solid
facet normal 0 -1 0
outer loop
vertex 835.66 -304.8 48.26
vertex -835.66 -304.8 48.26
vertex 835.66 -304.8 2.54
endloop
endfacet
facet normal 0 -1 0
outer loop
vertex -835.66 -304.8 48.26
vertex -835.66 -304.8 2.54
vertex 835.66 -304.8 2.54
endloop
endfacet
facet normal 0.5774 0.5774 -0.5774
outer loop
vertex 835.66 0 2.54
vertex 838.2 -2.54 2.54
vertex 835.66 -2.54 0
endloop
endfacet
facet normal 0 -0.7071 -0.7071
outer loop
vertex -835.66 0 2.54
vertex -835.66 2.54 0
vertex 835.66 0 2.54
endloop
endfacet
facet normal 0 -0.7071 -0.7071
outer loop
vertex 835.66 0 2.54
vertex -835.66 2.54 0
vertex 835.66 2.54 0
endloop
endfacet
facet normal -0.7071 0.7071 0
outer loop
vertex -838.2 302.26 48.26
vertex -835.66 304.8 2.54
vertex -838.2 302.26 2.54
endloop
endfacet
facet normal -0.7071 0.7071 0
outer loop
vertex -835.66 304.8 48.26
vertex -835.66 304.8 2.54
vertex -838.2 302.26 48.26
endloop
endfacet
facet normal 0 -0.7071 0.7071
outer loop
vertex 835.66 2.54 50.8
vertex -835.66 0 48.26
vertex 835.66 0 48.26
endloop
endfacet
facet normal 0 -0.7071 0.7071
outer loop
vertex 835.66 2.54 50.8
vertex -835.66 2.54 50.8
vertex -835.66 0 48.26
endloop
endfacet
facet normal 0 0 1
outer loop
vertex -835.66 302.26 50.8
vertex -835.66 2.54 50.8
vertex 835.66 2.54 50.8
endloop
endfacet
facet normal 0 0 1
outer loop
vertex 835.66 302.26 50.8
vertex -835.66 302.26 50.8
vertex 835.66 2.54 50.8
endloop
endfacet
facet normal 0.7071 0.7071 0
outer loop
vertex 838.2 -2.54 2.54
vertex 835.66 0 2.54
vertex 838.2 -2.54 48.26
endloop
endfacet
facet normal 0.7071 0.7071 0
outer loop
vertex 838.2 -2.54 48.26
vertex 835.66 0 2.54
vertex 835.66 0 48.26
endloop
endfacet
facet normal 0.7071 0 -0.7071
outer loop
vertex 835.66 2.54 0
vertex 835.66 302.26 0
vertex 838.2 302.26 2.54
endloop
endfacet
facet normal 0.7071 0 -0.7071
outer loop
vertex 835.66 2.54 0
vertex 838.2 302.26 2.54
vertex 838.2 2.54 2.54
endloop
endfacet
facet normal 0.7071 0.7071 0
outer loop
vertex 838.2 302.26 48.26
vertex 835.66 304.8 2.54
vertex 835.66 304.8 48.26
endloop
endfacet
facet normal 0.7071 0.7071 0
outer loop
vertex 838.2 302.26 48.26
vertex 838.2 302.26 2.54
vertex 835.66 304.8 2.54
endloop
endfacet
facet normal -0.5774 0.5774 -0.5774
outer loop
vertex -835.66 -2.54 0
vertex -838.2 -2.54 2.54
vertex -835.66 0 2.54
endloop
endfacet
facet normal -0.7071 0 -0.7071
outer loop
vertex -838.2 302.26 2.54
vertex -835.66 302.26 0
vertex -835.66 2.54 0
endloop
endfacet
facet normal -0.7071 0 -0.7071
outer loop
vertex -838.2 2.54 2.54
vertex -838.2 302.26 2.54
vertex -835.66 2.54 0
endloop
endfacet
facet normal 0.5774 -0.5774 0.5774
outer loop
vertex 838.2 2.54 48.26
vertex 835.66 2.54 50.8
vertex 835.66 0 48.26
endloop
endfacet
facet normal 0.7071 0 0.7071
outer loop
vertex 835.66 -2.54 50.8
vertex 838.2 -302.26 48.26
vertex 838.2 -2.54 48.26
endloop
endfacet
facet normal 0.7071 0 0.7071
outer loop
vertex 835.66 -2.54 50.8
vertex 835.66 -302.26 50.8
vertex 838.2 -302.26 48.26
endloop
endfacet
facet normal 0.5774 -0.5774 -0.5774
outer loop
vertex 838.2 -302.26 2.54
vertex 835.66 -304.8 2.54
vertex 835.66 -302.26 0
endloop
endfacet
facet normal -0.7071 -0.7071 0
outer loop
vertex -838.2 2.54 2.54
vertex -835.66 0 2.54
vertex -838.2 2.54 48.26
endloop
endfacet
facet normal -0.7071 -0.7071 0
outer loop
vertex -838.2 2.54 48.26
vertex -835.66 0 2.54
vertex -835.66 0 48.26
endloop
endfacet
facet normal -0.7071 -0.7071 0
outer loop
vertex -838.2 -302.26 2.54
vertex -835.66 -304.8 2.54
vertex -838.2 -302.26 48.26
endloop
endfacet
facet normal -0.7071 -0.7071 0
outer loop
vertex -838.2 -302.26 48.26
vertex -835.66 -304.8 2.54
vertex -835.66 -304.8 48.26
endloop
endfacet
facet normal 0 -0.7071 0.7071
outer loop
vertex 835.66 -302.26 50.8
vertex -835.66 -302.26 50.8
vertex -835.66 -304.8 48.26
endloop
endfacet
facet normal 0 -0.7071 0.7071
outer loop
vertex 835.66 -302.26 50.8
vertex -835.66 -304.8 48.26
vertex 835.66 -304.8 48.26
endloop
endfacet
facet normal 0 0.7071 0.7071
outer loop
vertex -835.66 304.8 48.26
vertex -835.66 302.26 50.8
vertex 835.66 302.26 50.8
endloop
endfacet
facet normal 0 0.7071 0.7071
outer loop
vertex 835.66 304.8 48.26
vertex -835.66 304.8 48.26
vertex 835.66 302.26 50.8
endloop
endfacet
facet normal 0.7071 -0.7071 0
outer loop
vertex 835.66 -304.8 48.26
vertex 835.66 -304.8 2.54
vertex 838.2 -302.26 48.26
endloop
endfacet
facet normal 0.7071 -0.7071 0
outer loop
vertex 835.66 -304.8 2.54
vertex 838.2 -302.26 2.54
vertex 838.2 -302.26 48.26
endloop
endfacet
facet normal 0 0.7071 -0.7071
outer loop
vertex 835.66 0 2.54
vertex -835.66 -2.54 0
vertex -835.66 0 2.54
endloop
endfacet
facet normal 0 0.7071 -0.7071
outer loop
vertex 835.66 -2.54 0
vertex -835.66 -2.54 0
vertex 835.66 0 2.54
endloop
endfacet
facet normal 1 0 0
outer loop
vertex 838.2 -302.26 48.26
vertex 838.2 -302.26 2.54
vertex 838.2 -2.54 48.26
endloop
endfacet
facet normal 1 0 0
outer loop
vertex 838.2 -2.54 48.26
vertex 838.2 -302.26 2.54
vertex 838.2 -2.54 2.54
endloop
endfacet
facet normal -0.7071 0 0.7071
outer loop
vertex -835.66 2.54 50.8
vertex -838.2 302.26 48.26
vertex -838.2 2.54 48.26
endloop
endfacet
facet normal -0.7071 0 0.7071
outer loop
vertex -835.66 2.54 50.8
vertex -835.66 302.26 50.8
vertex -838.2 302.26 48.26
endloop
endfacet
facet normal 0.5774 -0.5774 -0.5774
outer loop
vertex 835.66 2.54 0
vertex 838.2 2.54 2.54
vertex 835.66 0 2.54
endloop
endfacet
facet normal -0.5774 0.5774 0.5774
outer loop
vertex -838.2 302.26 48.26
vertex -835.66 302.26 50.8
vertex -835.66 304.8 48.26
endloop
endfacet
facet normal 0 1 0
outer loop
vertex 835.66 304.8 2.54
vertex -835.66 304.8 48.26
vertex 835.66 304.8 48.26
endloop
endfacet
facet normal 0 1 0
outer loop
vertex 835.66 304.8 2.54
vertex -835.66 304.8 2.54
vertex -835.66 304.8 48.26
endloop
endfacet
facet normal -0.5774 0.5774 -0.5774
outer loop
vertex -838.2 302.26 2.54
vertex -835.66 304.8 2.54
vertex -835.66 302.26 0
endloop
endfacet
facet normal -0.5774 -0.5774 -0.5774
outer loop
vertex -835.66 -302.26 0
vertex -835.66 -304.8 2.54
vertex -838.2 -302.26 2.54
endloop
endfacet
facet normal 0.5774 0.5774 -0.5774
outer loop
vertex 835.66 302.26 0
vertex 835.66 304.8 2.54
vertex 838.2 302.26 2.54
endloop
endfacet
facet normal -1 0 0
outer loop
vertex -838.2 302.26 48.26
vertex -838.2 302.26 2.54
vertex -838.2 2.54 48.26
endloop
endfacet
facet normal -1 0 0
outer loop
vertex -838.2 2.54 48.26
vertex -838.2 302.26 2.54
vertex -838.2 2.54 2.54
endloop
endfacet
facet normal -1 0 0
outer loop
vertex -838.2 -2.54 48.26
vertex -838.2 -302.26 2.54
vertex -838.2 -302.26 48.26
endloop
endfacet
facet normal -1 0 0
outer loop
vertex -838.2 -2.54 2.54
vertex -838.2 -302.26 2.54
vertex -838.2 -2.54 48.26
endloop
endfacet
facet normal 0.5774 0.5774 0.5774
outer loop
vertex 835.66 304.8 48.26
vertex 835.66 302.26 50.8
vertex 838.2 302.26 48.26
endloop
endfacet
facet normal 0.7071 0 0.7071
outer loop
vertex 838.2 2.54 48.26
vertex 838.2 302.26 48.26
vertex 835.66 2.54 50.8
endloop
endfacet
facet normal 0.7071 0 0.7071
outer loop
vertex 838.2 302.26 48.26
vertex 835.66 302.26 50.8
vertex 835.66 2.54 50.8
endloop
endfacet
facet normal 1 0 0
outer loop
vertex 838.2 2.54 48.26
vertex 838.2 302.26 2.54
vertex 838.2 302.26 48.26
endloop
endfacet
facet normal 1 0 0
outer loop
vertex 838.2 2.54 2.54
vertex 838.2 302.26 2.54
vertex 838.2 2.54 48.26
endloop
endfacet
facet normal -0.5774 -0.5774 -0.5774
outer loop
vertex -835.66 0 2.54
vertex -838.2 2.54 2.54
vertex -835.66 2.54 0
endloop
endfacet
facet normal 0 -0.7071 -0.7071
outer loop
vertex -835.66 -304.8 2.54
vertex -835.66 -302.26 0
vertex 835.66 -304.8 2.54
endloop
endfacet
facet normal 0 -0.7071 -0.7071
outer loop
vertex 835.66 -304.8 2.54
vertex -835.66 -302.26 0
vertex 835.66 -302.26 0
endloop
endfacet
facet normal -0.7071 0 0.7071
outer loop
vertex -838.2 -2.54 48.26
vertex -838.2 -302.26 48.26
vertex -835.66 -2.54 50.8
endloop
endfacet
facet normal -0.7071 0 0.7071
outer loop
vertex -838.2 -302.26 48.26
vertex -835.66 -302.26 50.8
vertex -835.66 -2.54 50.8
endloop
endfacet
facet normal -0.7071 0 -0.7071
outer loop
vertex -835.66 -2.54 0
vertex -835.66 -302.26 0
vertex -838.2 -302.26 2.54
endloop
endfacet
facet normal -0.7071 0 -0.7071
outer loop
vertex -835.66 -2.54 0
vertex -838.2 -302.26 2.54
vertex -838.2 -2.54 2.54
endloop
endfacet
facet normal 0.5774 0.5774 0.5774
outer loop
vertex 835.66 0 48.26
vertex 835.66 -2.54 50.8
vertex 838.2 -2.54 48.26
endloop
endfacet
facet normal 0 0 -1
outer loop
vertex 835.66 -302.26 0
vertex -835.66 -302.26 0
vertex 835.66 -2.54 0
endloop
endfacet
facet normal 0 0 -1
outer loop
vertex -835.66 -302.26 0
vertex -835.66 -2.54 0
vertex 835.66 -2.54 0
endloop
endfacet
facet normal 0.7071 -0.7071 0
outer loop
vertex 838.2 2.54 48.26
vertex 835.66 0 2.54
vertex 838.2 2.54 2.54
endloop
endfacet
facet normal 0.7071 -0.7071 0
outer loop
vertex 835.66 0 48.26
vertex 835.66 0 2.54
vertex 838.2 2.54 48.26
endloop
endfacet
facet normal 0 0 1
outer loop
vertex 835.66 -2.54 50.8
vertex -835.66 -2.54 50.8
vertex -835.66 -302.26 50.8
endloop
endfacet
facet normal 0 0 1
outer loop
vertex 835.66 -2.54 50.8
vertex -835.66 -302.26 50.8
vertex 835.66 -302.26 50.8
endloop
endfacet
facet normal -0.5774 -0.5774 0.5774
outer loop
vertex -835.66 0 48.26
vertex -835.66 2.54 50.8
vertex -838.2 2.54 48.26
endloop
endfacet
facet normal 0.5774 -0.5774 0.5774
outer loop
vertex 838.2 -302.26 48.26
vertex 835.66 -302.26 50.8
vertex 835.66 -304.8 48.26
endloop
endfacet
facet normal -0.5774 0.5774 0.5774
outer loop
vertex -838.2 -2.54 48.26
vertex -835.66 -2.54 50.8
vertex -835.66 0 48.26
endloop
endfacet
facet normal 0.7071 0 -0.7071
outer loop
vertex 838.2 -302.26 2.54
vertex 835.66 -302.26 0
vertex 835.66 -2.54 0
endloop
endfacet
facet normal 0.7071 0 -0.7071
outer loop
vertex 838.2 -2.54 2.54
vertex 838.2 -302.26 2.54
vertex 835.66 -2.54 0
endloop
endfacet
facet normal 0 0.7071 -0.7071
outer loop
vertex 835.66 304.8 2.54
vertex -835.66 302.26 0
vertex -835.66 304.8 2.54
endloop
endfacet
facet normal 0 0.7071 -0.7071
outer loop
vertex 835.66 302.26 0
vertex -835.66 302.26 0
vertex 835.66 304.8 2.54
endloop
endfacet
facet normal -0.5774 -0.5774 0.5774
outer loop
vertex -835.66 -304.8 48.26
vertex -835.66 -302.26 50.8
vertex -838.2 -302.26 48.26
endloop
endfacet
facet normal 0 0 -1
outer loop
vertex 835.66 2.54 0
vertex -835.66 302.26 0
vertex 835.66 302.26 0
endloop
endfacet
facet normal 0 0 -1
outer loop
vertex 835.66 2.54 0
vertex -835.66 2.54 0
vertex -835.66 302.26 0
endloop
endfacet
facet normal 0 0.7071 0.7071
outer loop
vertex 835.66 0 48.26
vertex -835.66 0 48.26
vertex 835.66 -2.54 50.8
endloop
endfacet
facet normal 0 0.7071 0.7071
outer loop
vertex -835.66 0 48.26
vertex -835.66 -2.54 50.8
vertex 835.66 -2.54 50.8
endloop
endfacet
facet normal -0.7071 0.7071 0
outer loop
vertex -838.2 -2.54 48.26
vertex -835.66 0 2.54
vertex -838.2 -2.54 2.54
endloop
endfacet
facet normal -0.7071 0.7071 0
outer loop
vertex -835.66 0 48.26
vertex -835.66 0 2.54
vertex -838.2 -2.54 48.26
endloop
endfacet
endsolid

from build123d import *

# Parameters (mm, degrees)
F0_W     = 1676.4
F0_H     = 304.8
F1_DEPTH = 50.8
F2_SIZE  = 2.54


with BuildPart() as f1:
    # F0 (on Top) → F1 (new body)
    with BuildSketch(Plane.XY):
        with Locations((0, -152.4)):
            Rectangle(F0_W, F0_H)
    extrude(amount=F1_DEPTH)

    # F2
    f2_edges = [f1.edges().sort_by_distance(p)[0] for p in [
        (838.2, -152.4, 50.8),
        (0, 0, 50.8),
        (-838.2, -152.4, 50.8),
        (0, -304.8, 50.8),
        (-838.2, -304.8, 25.4),
        (838.2, -304.8, 25.4),
        (0, -304.8, 0),
        (838.2, -152.4, 0),
        (-838.2, 0, 25.4),
        (-838.2, -152.4, 0),
        (838.2, 0, 25.4),
        (0, 0, 0),
    ]]
    chamfer(f2_edges, length=F2_SIZE)

    # F3: F1 across plane


with BuildPart() as f1_1:
    add(f1.part)
    add(f1.part.mirror(Plane.XZ))


solid = f1_1.part
